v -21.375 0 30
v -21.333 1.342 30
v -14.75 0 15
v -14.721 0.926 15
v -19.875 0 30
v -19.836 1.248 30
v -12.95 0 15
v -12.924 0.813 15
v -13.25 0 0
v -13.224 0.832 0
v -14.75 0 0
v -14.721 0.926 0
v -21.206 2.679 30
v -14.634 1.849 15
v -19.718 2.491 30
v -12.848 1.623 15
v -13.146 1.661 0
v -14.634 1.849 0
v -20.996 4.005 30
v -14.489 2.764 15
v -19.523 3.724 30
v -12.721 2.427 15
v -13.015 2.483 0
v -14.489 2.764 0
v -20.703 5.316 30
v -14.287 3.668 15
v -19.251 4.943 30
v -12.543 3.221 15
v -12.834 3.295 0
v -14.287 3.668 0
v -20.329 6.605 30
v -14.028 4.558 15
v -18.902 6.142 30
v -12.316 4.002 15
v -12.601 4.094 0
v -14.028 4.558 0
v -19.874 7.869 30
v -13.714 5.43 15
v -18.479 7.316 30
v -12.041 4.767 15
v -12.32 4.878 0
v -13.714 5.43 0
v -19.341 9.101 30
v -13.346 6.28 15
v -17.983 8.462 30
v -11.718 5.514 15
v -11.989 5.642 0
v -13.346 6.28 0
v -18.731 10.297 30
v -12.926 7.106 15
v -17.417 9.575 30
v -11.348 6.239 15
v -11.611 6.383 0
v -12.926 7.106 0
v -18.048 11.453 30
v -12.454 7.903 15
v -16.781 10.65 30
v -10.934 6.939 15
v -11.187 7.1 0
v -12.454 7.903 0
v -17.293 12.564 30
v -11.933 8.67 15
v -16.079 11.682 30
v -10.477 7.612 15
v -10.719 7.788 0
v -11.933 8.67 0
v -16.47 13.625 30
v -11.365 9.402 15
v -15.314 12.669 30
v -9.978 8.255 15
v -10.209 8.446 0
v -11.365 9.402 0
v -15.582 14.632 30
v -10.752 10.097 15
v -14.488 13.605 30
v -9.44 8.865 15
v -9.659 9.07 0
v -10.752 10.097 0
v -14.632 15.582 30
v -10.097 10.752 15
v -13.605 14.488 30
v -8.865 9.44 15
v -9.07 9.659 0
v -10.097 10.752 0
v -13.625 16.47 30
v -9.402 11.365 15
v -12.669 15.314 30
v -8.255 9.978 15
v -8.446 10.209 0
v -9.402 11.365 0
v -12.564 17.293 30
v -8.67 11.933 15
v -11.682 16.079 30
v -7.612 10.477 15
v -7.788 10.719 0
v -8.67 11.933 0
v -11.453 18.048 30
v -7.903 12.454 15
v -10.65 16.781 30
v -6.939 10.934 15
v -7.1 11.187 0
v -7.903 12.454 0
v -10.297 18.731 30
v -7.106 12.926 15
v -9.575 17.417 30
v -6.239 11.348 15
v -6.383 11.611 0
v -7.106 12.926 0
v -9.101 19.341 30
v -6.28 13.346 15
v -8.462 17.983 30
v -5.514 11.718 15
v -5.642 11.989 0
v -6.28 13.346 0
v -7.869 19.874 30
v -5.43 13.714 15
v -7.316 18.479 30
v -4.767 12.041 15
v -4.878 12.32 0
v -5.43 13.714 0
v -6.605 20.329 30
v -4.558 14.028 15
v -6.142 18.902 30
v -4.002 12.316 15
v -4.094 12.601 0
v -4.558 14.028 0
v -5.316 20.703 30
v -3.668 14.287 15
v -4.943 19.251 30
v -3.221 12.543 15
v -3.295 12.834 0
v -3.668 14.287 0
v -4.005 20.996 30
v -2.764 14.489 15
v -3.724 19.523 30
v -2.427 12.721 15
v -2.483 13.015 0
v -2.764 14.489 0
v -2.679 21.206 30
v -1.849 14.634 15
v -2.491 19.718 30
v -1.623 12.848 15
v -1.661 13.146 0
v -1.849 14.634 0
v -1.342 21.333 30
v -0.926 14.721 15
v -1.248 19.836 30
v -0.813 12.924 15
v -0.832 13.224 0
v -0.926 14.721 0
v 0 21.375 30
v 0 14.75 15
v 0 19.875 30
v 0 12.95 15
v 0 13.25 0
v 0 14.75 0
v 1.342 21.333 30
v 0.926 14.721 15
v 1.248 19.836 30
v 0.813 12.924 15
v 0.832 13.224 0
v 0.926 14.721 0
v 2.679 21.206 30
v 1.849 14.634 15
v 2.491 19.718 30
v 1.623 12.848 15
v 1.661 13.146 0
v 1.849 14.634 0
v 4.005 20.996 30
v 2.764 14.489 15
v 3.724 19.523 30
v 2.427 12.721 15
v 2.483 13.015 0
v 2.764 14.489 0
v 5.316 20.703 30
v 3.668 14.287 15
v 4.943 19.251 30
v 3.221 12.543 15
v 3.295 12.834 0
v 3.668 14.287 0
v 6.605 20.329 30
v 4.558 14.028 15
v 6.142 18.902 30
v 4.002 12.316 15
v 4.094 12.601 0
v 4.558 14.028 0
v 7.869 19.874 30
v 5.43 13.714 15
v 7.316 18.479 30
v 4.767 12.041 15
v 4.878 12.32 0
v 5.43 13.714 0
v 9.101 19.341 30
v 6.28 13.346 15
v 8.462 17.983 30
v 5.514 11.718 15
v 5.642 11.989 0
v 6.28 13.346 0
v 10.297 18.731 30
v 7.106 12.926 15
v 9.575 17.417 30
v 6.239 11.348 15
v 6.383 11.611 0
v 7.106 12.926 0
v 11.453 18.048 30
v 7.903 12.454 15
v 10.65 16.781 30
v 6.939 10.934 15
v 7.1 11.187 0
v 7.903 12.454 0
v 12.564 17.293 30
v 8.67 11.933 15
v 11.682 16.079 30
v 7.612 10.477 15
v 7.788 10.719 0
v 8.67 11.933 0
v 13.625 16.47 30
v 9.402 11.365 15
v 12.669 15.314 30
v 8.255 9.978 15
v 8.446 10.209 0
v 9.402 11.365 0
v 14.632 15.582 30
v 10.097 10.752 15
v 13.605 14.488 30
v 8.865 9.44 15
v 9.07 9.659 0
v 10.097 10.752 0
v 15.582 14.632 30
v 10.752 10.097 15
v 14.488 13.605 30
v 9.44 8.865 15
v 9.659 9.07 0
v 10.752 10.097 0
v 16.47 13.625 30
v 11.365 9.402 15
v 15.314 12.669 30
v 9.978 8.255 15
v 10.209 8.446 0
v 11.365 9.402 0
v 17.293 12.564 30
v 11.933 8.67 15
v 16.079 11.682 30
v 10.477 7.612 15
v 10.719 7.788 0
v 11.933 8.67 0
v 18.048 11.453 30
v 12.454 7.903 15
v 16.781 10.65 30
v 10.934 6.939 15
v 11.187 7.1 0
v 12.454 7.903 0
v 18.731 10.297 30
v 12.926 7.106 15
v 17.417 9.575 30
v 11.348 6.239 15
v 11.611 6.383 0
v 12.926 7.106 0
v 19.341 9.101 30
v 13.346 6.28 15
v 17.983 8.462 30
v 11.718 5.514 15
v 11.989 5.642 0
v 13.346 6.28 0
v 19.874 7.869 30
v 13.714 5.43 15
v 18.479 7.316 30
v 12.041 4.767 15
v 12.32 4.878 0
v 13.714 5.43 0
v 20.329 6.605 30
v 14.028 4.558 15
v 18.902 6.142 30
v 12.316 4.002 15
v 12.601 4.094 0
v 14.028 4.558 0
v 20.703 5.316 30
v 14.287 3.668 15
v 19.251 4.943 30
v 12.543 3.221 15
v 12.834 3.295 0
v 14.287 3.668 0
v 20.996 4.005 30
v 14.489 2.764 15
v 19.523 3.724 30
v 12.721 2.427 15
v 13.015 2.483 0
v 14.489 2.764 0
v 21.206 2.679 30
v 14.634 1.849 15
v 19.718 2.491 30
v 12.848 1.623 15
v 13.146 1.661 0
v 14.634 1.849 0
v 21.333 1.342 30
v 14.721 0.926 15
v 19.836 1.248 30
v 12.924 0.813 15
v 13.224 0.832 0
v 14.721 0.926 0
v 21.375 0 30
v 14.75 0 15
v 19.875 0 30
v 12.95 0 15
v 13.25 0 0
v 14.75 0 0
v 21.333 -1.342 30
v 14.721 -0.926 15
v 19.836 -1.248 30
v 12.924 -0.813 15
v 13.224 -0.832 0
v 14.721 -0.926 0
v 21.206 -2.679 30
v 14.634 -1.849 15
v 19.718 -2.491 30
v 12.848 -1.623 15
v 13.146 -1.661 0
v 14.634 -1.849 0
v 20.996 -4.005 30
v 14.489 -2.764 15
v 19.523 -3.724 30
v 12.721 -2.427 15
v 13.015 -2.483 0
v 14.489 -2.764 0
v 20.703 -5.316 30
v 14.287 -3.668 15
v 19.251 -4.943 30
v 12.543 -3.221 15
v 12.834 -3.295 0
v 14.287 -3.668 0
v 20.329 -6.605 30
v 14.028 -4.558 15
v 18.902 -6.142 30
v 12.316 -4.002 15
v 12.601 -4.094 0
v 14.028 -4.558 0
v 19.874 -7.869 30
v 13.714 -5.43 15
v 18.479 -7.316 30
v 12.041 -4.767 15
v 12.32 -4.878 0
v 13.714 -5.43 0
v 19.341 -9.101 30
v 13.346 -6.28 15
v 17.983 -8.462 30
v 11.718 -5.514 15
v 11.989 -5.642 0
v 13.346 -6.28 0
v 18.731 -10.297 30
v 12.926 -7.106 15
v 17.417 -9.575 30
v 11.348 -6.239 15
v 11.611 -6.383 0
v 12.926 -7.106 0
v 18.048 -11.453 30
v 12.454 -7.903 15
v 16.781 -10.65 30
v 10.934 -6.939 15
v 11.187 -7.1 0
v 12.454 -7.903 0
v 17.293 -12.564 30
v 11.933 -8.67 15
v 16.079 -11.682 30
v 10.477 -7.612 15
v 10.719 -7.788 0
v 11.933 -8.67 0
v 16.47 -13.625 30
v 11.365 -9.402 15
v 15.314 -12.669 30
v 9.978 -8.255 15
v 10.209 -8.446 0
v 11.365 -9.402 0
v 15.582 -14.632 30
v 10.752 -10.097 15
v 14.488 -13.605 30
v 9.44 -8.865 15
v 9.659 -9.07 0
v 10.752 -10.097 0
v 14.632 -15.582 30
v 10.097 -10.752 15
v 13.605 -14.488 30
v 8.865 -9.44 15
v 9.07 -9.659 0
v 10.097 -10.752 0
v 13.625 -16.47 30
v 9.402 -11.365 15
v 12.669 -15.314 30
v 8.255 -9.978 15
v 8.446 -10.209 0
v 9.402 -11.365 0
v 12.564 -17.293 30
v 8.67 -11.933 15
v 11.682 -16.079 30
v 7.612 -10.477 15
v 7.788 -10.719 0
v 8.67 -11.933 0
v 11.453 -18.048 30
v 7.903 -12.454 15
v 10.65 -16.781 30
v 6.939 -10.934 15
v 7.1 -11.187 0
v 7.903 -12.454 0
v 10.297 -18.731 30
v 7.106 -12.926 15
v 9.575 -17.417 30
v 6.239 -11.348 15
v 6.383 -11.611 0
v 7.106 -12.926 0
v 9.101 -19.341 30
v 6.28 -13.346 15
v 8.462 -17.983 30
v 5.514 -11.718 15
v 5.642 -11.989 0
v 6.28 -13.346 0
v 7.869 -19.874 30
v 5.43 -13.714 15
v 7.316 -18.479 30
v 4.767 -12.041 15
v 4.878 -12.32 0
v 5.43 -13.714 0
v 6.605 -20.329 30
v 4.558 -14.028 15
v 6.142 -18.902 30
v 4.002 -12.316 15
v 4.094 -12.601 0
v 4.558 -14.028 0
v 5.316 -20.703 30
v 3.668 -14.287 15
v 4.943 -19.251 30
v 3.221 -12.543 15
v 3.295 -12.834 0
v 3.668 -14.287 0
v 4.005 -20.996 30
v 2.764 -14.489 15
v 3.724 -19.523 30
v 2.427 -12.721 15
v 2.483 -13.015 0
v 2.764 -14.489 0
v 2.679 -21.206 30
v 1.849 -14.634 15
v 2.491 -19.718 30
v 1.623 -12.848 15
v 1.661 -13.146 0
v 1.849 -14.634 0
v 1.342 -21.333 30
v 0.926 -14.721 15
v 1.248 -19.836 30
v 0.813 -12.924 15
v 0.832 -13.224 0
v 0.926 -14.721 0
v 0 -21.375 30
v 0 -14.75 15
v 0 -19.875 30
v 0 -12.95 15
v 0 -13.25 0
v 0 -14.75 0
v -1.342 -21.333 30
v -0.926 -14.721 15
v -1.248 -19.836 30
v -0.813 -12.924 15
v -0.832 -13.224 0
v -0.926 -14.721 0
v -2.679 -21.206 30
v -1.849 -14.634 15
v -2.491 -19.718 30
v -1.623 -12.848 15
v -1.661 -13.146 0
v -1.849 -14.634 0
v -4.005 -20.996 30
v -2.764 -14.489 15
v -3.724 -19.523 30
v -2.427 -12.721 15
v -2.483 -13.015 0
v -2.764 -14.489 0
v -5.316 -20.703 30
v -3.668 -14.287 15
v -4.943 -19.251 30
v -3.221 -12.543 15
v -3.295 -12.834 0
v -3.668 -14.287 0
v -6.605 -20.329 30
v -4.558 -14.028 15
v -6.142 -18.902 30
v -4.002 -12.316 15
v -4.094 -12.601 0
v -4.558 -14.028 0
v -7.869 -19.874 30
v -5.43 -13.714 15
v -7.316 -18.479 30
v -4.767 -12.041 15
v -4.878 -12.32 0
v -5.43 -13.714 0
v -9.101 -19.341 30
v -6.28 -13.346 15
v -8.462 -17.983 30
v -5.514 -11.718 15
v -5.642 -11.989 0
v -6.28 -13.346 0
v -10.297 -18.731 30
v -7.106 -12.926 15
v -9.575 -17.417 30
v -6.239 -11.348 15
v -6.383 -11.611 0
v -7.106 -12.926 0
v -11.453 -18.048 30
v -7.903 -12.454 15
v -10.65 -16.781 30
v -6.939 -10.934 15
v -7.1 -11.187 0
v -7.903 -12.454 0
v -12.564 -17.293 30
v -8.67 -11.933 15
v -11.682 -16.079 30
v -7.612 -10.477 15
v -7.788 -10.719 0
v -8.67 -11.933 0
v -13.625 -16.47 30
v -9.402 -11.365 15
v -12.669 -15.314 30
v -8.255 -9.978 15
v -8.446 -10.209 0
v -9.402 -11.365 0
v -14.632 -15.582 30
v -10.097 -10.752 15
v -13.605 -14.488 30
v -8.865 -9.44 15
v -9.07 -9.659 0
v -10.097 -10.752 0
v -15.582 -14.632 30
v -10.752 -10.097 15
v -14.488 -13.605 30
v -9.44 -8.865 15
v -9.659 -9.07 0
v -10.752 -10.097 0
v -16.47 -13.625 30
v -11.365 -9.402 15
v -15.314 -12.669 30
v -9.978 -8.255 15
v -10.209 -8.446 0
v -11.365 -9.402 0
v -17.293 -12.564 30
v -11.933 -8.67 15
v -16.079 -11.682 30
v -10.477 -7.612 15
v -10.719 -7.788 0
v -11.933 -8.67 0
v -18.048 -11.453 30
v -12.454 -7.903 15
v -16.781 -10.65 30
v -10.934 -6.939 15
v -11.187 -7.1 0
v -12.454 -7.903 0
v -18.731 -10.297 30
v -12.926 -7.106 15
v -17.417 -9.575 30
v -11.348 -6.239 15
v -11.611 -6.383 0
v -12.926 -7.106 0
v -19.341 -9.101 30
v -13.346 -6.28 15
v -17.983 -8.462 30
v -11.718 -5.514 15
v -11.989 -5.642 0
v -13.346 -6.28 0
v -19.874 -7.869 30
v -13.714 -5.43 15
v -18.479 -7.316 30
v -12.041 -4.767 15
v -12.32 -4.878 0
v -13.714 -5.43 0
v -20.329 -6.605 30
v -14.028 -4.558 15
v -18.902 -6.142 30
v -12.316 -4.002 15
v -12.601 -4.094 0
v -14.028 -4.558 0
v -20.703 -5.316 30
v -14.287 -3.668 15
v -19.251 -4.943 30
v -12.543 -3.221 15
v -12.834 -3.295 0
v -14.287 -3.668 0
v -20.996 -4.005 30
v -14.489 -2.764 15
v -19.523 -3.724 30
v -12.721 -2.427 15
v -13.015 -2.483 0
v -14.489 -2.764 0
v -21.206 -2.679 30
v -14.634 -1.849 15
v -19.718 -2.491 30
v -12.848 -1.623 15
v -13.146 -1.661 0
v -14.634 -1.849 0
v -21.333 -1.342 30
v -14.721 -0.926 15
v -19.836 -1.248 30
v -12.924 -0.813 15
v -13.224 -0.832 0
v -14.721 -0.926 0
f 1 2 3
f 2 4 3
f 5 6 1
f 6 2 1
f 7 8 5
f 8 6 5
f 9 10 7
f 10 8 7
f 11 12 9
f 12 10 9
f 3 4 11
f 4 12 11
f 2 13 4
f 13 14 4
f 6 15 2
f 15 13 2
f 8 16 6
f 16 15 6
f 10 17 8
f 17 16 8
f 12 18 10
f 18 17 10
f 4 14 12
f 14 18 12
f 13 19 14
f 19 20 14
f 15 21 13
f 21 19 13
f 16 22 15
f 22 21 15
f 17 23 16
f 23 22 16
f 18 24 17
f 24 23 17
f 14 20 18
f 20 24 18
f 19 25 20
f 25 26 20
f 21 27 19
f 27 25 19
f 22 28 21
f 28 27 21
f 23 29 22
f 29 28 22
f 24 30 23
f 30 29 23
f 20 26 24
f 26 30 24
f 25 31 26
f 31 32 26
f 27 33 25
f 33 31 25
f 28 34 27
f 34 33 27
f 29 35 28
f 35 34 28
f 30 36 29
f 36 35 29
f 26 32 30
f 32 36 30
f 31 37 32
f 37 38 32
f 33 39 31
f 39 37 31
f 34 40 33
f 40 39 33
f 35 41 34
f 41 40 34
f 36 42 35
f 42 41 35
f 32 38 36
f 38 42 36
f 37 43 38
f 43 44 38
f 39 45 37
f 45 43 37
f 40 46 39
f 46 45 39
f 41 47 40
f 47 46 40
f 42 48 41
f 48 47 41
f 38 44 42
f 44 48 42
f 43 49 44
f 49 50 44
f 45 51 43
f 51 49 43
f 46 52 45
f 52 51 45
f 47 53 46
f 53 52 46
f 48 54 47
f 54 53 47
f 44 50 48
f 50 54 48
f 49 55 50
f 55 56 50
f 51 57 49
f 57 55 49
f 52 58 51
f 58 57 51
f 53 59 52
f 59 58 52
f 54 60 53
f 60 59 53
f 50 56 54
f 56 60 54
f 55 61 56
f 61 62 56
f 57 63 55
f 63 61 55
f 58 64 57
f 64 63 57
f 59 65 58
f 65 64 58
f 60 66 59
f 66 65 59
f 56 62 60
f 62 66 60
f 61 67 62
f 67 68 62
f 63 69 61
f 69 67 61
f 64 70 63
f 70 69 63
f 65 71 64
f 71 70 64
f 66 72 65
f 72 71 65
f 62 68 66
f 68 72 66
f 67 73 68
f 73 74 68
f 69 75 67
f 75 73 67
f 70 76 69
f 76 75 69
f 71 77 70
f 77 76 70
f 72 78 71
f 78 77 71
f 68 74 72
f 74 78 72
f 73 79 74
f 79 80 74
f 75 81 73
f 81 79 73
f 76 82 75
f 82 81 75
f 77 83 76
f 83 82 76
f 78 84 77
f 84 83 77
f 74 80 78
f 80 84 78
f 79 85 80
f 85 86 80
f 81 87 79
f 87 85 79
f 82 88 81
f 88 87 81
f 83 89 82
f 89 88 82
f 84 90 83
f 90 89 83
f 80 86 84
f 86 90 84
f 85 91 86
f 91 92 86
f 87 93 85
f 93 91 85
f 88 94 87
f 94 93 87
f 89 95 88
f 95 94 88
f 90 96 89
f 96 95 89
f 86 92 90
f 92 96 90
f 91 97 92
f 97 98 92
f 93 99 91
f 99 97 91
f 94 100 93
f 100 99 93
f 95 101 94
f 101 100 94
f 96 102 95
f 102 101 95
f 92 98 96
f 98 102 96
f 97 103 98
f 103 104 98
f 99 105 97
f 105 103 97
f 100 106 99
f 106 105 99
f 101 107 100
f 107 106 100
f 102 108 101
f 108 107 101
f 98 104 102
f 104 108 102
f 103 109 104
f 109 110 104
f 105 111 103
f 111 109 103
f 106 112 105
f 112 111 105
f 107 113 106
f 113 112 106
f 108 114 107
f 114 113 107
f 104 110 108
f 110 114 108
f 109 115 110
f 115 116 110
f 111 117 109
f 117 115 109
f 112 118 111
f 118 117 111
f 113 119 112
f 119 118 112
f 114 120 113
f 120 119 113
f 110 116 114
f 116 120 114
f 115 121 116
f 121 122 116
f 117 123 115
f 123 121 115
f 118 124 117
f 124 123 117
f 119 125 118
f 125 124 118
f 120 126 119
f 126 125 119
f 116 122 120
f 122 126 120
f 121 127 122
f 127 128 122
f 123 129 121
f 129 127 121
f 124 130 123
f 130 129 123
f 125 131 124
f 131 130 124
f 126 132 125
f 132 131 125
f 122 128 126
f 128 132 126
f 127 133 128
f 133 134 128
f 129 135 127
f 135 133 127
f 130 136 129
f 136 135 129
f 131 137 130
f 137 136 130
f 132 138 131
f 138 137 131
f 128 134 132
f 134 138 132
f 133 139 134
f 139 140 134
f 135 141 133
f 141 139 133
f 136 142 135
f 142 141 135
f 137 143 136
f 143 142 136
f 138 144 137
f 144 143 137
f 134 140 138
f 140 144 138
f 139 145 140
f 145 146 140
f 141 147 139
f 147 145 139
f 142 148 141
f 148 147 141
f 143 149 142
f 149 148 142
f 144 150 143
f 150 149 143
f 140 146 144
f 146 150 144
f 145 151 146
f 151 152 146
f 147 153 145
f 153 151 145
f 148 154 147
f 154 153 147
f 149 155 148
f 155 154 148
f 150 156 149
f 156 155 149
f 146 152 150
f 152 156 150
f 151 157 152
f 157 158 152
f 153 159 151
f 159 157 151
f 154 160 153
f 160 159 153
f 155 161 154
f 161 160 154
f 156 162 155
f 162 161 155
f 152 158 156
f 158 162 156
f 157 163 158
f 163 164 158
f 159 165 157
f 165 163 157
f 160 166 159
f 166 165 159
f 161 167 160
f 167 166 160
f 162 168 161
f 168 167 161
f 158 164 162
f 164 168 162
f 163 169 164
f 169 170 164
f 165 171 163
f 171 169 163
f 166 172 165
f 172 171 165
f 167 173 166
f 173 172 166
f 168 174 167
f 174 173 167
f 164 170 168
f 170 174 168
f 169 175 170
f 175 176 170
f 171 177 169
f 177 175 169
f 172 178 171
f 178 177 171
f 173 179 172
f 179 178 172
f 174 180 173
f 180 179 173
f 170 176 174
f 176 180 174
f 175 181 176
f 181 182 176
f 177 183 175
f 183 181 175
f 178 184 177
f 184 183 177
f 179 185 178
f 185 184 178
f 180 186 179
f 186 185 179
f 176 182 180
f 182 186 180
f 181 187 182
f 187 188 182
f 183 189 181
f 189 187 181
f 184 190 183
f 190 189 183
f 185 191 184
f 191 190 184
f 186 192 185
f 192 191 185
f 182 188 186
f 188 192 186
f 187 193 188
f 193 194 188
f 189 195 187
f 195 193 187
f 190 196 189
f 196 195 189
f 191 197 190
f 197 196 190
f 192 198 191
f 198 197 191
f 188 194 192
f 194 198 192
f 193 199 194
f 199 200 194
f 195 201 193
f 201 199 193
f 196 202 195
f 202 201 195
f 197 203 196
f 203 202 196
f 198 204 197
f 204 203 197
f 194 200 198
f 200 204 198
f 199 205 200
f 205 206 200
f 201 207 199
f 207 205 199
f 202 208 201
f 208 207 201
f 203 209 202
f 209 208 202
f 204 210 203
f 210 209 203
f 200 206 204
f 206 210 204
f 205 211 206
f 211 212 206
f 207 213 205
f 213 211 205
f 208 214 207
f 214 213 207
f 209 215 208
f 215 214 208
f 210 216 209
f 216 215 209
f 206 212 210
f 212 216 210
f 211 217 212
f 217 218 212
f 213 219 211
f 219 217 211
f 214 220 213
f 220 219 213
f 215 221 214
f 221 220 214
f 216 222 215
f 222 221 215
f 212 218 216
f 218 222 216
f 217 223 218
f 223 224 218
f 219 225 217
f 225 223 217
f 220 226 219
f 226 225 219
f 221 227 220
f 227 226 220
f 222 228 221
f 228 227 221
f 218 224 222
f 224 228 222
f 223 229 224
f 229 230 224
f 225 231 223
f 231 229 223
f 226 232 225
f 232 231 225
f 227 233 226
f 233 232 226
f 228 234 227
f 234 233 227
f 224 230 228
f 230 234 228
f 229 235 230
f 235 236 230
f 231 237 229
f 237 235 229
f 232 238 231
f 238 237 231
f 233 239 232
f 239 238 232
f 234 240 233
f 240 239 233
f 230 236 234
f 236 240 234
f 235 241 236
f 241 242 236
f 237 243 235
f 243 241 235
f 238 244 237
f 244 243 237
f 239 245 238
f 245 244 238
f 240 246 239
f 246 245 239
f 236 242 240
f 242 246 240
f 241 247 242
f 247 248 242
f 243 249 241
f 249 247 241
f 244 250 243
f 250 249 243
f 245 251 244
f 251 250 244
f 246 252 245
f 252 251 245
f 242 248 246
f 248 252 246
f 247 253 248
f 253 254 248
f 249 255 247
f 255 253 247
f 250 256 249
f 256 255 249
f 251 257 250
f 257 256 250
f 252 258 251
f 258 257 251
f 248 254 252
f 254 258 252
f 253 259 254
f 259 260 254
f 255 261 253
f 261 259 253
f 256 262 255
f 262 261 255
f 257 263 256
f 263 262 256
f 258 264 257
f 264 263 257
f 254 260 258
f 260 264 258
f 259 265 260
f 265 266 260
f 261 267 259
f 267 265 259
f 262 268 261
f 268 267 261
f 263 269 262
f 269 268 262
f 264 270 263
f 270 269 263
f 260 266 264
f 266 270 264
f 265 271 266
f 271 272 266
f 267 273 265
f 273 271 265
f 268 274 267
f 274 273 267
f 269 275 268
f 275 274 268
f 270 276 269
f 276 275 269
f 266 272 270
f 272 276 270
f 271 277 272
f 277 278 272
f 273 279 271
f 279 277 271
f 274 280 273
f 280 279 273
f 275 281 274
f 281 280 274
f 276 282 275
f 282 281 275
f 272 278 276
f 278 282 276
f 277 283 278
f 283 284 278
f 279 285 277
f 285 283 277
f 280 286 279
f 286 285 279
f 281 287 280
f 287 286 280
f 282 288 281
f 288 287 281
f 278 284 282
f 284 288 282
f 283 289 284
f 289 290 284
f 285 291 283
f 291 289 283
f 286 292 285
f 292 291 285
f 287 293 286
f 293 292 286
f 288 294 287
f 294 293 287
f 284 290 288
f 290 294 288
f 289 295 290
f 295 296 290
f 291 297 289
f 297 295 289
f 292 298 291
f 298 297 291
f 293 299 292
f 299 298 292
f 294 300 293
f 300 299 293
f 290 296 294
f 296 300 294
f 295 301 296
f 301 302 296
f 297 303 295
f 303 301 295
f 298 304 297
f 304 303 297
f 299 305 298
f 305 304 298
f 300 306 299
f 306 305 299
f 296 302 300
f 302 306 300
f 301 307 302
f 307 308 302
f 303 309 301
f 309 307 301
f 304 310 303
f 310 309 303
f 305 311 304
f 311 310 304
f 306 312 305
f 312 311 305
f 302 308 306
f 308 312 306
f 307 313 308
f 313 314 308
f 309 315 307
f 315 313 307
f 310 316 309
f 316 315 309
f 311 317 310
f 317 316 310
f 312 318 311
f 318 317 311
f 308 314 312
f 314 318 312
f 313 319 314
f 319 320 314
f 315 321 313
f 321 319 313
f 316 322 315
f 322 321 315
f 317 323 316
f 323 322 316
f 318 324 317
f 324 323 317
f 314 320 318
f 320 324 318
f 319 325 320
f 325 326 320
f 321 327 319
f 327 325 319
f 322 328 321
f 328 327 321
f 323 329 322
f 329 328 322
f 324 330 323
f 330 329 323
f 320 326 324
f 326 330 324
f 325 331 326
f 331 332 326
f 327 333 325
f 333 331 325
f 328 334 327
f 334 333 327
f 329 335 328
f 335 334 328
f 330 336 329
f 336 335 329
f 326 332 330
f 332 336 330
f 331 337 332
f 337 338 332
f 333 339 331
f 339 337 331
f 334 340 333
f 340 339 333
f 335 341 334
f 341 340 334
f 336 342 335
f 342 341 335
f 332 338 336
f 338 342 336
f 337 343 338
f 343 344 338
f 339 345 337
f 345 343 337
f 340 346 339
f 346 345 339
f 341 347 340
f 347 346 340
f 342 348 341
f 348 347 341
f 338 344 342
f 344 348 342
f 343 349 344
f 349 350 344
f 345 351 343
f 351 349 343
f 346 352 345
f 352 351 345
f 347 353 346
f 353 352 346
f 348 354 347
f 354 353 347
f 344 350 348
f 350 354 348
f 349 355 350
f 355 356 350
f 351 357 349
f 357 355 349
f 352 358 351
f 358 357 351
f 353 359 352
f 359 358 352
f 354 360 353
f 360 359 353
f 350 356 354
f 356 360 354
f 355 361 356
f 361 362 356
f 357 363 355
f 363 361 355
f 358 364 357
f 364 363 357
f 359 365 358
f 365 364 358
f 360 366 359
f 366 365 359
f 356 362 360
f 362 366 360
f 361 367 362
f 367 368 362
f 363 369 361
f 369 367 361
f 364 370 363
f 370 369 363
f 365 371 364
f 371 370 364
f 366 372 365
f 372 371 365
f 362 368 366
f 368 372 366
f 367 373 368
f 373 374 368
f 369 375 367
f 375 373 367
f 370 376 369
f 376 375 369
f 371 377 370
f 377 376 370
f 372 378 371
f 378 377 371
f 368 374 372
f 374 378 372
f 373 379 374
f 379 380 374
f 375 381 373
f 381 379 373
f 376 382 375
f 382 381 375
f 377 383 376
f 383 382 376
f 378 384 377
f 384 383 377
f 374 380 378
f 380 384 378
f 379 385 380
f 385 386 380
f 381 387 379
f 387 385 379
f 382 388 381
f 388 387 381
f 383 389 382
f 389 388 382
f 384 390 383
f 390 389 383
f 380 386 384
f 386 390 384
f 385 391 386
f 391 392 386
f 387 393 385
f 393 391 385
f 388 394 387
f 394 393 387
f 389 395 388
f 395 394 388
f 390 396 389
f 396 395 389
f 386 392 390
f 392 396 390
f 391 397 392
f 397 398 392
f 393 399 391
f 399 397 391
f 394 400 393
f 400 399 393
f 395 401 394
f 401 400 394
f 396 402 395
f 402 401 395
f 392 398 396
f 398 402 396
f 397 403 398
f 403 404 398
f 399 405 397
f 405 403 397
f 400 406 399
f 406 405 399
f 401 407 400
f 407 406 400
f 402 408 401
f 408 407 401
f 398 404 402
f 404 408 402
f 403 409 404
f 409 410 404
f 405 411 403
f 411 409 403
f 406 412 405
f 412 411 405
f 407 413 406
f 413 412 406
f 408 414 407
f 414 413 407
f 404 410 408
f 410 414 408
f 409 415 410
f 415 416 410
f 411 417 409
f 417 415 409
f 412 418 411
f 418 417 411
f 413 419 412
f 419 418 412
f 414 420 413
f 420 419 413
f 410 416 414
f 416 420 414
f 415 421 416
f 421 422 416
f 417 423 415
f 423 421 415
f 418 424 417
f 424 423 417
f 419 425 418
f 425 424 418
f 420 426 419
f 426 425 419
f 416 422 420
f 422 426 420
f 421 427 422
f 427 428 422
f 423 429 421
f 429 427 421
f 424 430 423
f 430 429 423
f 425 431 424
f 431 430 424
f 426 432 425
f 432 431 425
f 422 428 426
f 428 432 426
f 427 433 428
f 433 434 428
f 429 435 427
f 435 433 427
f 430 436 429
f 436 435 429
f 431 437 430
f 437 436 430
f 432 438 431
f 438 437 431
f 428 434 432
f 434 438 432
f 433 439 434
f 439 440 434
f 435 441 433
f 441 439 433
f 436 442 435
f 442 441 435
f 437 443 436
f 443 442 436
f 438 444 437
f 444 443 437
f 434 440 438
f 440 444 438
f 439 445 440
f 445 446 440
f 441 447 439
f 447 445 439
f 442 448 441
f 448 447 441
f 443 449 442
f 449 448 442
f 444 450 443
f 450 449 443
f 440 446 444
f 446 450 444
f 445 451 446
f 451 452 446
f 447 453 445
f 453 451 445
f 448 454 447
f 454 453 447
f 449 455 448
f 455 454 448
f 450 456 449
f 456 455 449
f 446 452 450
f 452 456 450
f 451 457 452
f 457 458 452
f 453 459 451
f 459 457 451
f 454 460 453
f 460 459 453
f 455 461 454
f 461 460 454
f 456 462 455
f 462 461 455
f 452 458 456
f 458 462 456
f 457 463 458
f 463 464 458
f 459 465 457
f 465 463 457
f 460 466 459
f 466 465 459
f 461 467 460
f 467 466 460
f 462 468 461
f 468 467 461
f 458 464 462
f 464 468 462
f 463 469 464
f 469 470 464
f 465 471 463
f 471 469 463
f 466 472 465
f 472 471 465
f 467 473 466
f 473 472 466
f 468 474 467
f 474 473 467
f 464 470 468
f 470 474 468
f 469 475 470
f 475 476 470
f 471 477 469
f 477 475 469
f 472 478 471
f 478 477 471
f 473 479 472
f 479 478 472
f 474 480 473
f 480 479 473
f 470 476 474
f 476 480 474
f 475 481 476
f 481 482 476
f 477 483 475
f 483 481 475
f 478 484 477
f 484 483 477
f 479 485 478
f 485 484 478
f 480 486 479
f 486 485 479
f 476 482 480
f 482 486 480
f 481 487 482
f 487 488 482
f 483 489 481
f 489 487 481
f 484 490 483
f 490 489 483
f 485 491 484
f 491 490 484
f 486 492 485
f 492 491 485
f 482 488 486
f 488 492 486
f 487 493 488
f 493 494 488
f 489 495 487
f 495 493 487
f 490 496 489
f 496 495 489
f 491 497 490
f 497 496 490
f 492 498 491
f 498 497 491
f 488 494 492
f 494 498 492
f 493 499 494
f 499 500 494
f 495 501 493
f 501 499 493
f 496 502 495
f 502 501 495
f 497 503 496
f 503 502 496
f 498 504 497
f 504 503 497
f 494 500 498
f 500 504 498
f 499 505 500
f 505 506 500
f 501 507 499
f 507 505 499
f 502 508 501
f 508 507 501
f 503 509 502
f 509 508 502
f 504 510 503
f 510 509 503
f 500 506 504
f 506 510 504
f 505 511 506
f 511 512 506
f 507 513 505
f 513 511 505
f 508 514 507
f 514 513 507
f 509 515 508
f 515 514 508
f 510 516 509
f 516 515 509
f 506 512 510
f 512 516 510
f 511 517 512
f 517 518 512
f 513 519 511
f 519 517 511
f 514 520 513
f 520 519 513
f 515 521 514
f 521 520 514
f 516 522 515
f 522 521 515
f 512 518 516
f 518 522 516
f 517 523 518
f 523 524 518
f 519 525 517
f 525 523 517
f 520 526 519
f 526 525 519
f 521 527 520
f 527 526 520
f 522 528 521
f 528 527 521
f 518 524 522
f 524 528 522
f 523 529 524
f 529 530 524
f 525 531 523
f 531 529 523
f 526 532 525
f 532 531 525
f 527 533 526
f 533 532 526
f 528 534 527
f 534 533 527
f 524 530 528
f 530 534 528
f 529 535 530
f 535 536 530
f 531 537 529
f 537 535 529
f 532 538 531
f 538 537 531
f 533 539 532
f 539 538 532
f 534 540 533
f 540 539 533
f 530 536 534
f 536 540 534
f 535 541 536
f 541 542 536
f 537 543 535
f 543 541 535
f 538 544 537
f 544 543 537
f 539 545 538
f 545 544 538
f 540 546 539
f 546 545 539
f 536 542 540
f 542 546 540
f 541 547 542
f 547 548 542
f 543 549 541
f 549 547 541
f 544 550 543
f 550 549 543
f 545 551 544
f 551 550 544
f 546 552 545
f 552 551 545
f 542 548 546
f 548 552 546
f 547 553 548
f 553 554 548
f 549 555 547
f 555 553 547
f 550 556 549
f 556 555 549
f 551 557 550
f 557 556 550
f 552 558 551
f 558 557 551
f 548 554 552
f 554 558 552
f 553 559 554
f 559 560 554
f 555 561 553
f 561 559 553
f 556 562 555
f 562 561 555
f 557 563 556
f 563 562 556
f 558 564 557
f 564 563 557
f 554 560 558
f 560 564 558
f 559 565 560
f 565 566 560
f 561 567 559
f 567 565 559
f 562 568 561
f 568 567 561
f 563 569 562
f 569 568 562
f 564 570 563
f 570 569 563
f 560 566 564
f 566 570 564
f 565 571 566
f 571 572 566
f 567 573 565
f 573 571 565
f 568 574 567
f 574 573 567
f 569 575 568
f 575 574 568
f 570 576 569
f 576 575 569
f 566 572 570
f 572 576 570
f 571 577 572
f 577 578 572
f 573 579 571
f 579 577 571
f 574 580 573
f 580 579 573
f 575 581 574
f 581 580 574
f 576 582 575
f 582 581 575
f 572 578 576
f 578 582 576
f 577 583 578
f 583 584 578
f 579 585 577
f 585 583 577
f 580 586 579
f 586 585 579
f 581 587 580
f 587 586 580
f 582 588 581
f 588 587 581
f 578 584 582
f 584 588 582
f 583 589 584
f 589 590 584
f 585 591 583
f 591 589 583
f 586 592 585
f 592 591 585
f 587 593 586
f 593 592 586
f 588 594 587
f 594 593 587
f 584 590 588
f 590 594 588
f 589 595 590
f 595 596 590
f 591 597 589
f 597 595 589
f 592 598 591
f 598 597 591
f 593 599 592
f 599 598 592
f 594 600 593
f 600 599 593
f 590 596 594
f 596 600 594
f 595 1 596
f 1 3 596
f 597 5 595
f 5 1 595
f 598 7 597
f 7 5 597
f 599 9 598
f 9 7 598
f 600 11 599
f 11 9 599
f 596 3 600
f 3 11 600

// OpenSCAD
// 26.5 .. inner diam
// 1.5mm

D = 26.5;
R = D/2;
W = 1.5;
$fn=100;

module shape()
    polygon([
        [0,0], [R+W,0], 
        [R+W, 15], 
        [1.5*R+W , 30],  
        [1.5*R, 30],
        [R-0.3, 15], [R , 0]
    ]);

rotate_extrude(angle = 360)
shape();

//diameter = 1.5*D;
//linear_extrude(1)
//    difference() {
//        circle(d = diameter);
//        
//        for(j = [1:1:5])
//        for(i = [0 :6+ j*6: 360 ])
//          rotate(i)
//            translate([20-3*j, 0])
//              circle(d = 2.4);
// 
//    }
